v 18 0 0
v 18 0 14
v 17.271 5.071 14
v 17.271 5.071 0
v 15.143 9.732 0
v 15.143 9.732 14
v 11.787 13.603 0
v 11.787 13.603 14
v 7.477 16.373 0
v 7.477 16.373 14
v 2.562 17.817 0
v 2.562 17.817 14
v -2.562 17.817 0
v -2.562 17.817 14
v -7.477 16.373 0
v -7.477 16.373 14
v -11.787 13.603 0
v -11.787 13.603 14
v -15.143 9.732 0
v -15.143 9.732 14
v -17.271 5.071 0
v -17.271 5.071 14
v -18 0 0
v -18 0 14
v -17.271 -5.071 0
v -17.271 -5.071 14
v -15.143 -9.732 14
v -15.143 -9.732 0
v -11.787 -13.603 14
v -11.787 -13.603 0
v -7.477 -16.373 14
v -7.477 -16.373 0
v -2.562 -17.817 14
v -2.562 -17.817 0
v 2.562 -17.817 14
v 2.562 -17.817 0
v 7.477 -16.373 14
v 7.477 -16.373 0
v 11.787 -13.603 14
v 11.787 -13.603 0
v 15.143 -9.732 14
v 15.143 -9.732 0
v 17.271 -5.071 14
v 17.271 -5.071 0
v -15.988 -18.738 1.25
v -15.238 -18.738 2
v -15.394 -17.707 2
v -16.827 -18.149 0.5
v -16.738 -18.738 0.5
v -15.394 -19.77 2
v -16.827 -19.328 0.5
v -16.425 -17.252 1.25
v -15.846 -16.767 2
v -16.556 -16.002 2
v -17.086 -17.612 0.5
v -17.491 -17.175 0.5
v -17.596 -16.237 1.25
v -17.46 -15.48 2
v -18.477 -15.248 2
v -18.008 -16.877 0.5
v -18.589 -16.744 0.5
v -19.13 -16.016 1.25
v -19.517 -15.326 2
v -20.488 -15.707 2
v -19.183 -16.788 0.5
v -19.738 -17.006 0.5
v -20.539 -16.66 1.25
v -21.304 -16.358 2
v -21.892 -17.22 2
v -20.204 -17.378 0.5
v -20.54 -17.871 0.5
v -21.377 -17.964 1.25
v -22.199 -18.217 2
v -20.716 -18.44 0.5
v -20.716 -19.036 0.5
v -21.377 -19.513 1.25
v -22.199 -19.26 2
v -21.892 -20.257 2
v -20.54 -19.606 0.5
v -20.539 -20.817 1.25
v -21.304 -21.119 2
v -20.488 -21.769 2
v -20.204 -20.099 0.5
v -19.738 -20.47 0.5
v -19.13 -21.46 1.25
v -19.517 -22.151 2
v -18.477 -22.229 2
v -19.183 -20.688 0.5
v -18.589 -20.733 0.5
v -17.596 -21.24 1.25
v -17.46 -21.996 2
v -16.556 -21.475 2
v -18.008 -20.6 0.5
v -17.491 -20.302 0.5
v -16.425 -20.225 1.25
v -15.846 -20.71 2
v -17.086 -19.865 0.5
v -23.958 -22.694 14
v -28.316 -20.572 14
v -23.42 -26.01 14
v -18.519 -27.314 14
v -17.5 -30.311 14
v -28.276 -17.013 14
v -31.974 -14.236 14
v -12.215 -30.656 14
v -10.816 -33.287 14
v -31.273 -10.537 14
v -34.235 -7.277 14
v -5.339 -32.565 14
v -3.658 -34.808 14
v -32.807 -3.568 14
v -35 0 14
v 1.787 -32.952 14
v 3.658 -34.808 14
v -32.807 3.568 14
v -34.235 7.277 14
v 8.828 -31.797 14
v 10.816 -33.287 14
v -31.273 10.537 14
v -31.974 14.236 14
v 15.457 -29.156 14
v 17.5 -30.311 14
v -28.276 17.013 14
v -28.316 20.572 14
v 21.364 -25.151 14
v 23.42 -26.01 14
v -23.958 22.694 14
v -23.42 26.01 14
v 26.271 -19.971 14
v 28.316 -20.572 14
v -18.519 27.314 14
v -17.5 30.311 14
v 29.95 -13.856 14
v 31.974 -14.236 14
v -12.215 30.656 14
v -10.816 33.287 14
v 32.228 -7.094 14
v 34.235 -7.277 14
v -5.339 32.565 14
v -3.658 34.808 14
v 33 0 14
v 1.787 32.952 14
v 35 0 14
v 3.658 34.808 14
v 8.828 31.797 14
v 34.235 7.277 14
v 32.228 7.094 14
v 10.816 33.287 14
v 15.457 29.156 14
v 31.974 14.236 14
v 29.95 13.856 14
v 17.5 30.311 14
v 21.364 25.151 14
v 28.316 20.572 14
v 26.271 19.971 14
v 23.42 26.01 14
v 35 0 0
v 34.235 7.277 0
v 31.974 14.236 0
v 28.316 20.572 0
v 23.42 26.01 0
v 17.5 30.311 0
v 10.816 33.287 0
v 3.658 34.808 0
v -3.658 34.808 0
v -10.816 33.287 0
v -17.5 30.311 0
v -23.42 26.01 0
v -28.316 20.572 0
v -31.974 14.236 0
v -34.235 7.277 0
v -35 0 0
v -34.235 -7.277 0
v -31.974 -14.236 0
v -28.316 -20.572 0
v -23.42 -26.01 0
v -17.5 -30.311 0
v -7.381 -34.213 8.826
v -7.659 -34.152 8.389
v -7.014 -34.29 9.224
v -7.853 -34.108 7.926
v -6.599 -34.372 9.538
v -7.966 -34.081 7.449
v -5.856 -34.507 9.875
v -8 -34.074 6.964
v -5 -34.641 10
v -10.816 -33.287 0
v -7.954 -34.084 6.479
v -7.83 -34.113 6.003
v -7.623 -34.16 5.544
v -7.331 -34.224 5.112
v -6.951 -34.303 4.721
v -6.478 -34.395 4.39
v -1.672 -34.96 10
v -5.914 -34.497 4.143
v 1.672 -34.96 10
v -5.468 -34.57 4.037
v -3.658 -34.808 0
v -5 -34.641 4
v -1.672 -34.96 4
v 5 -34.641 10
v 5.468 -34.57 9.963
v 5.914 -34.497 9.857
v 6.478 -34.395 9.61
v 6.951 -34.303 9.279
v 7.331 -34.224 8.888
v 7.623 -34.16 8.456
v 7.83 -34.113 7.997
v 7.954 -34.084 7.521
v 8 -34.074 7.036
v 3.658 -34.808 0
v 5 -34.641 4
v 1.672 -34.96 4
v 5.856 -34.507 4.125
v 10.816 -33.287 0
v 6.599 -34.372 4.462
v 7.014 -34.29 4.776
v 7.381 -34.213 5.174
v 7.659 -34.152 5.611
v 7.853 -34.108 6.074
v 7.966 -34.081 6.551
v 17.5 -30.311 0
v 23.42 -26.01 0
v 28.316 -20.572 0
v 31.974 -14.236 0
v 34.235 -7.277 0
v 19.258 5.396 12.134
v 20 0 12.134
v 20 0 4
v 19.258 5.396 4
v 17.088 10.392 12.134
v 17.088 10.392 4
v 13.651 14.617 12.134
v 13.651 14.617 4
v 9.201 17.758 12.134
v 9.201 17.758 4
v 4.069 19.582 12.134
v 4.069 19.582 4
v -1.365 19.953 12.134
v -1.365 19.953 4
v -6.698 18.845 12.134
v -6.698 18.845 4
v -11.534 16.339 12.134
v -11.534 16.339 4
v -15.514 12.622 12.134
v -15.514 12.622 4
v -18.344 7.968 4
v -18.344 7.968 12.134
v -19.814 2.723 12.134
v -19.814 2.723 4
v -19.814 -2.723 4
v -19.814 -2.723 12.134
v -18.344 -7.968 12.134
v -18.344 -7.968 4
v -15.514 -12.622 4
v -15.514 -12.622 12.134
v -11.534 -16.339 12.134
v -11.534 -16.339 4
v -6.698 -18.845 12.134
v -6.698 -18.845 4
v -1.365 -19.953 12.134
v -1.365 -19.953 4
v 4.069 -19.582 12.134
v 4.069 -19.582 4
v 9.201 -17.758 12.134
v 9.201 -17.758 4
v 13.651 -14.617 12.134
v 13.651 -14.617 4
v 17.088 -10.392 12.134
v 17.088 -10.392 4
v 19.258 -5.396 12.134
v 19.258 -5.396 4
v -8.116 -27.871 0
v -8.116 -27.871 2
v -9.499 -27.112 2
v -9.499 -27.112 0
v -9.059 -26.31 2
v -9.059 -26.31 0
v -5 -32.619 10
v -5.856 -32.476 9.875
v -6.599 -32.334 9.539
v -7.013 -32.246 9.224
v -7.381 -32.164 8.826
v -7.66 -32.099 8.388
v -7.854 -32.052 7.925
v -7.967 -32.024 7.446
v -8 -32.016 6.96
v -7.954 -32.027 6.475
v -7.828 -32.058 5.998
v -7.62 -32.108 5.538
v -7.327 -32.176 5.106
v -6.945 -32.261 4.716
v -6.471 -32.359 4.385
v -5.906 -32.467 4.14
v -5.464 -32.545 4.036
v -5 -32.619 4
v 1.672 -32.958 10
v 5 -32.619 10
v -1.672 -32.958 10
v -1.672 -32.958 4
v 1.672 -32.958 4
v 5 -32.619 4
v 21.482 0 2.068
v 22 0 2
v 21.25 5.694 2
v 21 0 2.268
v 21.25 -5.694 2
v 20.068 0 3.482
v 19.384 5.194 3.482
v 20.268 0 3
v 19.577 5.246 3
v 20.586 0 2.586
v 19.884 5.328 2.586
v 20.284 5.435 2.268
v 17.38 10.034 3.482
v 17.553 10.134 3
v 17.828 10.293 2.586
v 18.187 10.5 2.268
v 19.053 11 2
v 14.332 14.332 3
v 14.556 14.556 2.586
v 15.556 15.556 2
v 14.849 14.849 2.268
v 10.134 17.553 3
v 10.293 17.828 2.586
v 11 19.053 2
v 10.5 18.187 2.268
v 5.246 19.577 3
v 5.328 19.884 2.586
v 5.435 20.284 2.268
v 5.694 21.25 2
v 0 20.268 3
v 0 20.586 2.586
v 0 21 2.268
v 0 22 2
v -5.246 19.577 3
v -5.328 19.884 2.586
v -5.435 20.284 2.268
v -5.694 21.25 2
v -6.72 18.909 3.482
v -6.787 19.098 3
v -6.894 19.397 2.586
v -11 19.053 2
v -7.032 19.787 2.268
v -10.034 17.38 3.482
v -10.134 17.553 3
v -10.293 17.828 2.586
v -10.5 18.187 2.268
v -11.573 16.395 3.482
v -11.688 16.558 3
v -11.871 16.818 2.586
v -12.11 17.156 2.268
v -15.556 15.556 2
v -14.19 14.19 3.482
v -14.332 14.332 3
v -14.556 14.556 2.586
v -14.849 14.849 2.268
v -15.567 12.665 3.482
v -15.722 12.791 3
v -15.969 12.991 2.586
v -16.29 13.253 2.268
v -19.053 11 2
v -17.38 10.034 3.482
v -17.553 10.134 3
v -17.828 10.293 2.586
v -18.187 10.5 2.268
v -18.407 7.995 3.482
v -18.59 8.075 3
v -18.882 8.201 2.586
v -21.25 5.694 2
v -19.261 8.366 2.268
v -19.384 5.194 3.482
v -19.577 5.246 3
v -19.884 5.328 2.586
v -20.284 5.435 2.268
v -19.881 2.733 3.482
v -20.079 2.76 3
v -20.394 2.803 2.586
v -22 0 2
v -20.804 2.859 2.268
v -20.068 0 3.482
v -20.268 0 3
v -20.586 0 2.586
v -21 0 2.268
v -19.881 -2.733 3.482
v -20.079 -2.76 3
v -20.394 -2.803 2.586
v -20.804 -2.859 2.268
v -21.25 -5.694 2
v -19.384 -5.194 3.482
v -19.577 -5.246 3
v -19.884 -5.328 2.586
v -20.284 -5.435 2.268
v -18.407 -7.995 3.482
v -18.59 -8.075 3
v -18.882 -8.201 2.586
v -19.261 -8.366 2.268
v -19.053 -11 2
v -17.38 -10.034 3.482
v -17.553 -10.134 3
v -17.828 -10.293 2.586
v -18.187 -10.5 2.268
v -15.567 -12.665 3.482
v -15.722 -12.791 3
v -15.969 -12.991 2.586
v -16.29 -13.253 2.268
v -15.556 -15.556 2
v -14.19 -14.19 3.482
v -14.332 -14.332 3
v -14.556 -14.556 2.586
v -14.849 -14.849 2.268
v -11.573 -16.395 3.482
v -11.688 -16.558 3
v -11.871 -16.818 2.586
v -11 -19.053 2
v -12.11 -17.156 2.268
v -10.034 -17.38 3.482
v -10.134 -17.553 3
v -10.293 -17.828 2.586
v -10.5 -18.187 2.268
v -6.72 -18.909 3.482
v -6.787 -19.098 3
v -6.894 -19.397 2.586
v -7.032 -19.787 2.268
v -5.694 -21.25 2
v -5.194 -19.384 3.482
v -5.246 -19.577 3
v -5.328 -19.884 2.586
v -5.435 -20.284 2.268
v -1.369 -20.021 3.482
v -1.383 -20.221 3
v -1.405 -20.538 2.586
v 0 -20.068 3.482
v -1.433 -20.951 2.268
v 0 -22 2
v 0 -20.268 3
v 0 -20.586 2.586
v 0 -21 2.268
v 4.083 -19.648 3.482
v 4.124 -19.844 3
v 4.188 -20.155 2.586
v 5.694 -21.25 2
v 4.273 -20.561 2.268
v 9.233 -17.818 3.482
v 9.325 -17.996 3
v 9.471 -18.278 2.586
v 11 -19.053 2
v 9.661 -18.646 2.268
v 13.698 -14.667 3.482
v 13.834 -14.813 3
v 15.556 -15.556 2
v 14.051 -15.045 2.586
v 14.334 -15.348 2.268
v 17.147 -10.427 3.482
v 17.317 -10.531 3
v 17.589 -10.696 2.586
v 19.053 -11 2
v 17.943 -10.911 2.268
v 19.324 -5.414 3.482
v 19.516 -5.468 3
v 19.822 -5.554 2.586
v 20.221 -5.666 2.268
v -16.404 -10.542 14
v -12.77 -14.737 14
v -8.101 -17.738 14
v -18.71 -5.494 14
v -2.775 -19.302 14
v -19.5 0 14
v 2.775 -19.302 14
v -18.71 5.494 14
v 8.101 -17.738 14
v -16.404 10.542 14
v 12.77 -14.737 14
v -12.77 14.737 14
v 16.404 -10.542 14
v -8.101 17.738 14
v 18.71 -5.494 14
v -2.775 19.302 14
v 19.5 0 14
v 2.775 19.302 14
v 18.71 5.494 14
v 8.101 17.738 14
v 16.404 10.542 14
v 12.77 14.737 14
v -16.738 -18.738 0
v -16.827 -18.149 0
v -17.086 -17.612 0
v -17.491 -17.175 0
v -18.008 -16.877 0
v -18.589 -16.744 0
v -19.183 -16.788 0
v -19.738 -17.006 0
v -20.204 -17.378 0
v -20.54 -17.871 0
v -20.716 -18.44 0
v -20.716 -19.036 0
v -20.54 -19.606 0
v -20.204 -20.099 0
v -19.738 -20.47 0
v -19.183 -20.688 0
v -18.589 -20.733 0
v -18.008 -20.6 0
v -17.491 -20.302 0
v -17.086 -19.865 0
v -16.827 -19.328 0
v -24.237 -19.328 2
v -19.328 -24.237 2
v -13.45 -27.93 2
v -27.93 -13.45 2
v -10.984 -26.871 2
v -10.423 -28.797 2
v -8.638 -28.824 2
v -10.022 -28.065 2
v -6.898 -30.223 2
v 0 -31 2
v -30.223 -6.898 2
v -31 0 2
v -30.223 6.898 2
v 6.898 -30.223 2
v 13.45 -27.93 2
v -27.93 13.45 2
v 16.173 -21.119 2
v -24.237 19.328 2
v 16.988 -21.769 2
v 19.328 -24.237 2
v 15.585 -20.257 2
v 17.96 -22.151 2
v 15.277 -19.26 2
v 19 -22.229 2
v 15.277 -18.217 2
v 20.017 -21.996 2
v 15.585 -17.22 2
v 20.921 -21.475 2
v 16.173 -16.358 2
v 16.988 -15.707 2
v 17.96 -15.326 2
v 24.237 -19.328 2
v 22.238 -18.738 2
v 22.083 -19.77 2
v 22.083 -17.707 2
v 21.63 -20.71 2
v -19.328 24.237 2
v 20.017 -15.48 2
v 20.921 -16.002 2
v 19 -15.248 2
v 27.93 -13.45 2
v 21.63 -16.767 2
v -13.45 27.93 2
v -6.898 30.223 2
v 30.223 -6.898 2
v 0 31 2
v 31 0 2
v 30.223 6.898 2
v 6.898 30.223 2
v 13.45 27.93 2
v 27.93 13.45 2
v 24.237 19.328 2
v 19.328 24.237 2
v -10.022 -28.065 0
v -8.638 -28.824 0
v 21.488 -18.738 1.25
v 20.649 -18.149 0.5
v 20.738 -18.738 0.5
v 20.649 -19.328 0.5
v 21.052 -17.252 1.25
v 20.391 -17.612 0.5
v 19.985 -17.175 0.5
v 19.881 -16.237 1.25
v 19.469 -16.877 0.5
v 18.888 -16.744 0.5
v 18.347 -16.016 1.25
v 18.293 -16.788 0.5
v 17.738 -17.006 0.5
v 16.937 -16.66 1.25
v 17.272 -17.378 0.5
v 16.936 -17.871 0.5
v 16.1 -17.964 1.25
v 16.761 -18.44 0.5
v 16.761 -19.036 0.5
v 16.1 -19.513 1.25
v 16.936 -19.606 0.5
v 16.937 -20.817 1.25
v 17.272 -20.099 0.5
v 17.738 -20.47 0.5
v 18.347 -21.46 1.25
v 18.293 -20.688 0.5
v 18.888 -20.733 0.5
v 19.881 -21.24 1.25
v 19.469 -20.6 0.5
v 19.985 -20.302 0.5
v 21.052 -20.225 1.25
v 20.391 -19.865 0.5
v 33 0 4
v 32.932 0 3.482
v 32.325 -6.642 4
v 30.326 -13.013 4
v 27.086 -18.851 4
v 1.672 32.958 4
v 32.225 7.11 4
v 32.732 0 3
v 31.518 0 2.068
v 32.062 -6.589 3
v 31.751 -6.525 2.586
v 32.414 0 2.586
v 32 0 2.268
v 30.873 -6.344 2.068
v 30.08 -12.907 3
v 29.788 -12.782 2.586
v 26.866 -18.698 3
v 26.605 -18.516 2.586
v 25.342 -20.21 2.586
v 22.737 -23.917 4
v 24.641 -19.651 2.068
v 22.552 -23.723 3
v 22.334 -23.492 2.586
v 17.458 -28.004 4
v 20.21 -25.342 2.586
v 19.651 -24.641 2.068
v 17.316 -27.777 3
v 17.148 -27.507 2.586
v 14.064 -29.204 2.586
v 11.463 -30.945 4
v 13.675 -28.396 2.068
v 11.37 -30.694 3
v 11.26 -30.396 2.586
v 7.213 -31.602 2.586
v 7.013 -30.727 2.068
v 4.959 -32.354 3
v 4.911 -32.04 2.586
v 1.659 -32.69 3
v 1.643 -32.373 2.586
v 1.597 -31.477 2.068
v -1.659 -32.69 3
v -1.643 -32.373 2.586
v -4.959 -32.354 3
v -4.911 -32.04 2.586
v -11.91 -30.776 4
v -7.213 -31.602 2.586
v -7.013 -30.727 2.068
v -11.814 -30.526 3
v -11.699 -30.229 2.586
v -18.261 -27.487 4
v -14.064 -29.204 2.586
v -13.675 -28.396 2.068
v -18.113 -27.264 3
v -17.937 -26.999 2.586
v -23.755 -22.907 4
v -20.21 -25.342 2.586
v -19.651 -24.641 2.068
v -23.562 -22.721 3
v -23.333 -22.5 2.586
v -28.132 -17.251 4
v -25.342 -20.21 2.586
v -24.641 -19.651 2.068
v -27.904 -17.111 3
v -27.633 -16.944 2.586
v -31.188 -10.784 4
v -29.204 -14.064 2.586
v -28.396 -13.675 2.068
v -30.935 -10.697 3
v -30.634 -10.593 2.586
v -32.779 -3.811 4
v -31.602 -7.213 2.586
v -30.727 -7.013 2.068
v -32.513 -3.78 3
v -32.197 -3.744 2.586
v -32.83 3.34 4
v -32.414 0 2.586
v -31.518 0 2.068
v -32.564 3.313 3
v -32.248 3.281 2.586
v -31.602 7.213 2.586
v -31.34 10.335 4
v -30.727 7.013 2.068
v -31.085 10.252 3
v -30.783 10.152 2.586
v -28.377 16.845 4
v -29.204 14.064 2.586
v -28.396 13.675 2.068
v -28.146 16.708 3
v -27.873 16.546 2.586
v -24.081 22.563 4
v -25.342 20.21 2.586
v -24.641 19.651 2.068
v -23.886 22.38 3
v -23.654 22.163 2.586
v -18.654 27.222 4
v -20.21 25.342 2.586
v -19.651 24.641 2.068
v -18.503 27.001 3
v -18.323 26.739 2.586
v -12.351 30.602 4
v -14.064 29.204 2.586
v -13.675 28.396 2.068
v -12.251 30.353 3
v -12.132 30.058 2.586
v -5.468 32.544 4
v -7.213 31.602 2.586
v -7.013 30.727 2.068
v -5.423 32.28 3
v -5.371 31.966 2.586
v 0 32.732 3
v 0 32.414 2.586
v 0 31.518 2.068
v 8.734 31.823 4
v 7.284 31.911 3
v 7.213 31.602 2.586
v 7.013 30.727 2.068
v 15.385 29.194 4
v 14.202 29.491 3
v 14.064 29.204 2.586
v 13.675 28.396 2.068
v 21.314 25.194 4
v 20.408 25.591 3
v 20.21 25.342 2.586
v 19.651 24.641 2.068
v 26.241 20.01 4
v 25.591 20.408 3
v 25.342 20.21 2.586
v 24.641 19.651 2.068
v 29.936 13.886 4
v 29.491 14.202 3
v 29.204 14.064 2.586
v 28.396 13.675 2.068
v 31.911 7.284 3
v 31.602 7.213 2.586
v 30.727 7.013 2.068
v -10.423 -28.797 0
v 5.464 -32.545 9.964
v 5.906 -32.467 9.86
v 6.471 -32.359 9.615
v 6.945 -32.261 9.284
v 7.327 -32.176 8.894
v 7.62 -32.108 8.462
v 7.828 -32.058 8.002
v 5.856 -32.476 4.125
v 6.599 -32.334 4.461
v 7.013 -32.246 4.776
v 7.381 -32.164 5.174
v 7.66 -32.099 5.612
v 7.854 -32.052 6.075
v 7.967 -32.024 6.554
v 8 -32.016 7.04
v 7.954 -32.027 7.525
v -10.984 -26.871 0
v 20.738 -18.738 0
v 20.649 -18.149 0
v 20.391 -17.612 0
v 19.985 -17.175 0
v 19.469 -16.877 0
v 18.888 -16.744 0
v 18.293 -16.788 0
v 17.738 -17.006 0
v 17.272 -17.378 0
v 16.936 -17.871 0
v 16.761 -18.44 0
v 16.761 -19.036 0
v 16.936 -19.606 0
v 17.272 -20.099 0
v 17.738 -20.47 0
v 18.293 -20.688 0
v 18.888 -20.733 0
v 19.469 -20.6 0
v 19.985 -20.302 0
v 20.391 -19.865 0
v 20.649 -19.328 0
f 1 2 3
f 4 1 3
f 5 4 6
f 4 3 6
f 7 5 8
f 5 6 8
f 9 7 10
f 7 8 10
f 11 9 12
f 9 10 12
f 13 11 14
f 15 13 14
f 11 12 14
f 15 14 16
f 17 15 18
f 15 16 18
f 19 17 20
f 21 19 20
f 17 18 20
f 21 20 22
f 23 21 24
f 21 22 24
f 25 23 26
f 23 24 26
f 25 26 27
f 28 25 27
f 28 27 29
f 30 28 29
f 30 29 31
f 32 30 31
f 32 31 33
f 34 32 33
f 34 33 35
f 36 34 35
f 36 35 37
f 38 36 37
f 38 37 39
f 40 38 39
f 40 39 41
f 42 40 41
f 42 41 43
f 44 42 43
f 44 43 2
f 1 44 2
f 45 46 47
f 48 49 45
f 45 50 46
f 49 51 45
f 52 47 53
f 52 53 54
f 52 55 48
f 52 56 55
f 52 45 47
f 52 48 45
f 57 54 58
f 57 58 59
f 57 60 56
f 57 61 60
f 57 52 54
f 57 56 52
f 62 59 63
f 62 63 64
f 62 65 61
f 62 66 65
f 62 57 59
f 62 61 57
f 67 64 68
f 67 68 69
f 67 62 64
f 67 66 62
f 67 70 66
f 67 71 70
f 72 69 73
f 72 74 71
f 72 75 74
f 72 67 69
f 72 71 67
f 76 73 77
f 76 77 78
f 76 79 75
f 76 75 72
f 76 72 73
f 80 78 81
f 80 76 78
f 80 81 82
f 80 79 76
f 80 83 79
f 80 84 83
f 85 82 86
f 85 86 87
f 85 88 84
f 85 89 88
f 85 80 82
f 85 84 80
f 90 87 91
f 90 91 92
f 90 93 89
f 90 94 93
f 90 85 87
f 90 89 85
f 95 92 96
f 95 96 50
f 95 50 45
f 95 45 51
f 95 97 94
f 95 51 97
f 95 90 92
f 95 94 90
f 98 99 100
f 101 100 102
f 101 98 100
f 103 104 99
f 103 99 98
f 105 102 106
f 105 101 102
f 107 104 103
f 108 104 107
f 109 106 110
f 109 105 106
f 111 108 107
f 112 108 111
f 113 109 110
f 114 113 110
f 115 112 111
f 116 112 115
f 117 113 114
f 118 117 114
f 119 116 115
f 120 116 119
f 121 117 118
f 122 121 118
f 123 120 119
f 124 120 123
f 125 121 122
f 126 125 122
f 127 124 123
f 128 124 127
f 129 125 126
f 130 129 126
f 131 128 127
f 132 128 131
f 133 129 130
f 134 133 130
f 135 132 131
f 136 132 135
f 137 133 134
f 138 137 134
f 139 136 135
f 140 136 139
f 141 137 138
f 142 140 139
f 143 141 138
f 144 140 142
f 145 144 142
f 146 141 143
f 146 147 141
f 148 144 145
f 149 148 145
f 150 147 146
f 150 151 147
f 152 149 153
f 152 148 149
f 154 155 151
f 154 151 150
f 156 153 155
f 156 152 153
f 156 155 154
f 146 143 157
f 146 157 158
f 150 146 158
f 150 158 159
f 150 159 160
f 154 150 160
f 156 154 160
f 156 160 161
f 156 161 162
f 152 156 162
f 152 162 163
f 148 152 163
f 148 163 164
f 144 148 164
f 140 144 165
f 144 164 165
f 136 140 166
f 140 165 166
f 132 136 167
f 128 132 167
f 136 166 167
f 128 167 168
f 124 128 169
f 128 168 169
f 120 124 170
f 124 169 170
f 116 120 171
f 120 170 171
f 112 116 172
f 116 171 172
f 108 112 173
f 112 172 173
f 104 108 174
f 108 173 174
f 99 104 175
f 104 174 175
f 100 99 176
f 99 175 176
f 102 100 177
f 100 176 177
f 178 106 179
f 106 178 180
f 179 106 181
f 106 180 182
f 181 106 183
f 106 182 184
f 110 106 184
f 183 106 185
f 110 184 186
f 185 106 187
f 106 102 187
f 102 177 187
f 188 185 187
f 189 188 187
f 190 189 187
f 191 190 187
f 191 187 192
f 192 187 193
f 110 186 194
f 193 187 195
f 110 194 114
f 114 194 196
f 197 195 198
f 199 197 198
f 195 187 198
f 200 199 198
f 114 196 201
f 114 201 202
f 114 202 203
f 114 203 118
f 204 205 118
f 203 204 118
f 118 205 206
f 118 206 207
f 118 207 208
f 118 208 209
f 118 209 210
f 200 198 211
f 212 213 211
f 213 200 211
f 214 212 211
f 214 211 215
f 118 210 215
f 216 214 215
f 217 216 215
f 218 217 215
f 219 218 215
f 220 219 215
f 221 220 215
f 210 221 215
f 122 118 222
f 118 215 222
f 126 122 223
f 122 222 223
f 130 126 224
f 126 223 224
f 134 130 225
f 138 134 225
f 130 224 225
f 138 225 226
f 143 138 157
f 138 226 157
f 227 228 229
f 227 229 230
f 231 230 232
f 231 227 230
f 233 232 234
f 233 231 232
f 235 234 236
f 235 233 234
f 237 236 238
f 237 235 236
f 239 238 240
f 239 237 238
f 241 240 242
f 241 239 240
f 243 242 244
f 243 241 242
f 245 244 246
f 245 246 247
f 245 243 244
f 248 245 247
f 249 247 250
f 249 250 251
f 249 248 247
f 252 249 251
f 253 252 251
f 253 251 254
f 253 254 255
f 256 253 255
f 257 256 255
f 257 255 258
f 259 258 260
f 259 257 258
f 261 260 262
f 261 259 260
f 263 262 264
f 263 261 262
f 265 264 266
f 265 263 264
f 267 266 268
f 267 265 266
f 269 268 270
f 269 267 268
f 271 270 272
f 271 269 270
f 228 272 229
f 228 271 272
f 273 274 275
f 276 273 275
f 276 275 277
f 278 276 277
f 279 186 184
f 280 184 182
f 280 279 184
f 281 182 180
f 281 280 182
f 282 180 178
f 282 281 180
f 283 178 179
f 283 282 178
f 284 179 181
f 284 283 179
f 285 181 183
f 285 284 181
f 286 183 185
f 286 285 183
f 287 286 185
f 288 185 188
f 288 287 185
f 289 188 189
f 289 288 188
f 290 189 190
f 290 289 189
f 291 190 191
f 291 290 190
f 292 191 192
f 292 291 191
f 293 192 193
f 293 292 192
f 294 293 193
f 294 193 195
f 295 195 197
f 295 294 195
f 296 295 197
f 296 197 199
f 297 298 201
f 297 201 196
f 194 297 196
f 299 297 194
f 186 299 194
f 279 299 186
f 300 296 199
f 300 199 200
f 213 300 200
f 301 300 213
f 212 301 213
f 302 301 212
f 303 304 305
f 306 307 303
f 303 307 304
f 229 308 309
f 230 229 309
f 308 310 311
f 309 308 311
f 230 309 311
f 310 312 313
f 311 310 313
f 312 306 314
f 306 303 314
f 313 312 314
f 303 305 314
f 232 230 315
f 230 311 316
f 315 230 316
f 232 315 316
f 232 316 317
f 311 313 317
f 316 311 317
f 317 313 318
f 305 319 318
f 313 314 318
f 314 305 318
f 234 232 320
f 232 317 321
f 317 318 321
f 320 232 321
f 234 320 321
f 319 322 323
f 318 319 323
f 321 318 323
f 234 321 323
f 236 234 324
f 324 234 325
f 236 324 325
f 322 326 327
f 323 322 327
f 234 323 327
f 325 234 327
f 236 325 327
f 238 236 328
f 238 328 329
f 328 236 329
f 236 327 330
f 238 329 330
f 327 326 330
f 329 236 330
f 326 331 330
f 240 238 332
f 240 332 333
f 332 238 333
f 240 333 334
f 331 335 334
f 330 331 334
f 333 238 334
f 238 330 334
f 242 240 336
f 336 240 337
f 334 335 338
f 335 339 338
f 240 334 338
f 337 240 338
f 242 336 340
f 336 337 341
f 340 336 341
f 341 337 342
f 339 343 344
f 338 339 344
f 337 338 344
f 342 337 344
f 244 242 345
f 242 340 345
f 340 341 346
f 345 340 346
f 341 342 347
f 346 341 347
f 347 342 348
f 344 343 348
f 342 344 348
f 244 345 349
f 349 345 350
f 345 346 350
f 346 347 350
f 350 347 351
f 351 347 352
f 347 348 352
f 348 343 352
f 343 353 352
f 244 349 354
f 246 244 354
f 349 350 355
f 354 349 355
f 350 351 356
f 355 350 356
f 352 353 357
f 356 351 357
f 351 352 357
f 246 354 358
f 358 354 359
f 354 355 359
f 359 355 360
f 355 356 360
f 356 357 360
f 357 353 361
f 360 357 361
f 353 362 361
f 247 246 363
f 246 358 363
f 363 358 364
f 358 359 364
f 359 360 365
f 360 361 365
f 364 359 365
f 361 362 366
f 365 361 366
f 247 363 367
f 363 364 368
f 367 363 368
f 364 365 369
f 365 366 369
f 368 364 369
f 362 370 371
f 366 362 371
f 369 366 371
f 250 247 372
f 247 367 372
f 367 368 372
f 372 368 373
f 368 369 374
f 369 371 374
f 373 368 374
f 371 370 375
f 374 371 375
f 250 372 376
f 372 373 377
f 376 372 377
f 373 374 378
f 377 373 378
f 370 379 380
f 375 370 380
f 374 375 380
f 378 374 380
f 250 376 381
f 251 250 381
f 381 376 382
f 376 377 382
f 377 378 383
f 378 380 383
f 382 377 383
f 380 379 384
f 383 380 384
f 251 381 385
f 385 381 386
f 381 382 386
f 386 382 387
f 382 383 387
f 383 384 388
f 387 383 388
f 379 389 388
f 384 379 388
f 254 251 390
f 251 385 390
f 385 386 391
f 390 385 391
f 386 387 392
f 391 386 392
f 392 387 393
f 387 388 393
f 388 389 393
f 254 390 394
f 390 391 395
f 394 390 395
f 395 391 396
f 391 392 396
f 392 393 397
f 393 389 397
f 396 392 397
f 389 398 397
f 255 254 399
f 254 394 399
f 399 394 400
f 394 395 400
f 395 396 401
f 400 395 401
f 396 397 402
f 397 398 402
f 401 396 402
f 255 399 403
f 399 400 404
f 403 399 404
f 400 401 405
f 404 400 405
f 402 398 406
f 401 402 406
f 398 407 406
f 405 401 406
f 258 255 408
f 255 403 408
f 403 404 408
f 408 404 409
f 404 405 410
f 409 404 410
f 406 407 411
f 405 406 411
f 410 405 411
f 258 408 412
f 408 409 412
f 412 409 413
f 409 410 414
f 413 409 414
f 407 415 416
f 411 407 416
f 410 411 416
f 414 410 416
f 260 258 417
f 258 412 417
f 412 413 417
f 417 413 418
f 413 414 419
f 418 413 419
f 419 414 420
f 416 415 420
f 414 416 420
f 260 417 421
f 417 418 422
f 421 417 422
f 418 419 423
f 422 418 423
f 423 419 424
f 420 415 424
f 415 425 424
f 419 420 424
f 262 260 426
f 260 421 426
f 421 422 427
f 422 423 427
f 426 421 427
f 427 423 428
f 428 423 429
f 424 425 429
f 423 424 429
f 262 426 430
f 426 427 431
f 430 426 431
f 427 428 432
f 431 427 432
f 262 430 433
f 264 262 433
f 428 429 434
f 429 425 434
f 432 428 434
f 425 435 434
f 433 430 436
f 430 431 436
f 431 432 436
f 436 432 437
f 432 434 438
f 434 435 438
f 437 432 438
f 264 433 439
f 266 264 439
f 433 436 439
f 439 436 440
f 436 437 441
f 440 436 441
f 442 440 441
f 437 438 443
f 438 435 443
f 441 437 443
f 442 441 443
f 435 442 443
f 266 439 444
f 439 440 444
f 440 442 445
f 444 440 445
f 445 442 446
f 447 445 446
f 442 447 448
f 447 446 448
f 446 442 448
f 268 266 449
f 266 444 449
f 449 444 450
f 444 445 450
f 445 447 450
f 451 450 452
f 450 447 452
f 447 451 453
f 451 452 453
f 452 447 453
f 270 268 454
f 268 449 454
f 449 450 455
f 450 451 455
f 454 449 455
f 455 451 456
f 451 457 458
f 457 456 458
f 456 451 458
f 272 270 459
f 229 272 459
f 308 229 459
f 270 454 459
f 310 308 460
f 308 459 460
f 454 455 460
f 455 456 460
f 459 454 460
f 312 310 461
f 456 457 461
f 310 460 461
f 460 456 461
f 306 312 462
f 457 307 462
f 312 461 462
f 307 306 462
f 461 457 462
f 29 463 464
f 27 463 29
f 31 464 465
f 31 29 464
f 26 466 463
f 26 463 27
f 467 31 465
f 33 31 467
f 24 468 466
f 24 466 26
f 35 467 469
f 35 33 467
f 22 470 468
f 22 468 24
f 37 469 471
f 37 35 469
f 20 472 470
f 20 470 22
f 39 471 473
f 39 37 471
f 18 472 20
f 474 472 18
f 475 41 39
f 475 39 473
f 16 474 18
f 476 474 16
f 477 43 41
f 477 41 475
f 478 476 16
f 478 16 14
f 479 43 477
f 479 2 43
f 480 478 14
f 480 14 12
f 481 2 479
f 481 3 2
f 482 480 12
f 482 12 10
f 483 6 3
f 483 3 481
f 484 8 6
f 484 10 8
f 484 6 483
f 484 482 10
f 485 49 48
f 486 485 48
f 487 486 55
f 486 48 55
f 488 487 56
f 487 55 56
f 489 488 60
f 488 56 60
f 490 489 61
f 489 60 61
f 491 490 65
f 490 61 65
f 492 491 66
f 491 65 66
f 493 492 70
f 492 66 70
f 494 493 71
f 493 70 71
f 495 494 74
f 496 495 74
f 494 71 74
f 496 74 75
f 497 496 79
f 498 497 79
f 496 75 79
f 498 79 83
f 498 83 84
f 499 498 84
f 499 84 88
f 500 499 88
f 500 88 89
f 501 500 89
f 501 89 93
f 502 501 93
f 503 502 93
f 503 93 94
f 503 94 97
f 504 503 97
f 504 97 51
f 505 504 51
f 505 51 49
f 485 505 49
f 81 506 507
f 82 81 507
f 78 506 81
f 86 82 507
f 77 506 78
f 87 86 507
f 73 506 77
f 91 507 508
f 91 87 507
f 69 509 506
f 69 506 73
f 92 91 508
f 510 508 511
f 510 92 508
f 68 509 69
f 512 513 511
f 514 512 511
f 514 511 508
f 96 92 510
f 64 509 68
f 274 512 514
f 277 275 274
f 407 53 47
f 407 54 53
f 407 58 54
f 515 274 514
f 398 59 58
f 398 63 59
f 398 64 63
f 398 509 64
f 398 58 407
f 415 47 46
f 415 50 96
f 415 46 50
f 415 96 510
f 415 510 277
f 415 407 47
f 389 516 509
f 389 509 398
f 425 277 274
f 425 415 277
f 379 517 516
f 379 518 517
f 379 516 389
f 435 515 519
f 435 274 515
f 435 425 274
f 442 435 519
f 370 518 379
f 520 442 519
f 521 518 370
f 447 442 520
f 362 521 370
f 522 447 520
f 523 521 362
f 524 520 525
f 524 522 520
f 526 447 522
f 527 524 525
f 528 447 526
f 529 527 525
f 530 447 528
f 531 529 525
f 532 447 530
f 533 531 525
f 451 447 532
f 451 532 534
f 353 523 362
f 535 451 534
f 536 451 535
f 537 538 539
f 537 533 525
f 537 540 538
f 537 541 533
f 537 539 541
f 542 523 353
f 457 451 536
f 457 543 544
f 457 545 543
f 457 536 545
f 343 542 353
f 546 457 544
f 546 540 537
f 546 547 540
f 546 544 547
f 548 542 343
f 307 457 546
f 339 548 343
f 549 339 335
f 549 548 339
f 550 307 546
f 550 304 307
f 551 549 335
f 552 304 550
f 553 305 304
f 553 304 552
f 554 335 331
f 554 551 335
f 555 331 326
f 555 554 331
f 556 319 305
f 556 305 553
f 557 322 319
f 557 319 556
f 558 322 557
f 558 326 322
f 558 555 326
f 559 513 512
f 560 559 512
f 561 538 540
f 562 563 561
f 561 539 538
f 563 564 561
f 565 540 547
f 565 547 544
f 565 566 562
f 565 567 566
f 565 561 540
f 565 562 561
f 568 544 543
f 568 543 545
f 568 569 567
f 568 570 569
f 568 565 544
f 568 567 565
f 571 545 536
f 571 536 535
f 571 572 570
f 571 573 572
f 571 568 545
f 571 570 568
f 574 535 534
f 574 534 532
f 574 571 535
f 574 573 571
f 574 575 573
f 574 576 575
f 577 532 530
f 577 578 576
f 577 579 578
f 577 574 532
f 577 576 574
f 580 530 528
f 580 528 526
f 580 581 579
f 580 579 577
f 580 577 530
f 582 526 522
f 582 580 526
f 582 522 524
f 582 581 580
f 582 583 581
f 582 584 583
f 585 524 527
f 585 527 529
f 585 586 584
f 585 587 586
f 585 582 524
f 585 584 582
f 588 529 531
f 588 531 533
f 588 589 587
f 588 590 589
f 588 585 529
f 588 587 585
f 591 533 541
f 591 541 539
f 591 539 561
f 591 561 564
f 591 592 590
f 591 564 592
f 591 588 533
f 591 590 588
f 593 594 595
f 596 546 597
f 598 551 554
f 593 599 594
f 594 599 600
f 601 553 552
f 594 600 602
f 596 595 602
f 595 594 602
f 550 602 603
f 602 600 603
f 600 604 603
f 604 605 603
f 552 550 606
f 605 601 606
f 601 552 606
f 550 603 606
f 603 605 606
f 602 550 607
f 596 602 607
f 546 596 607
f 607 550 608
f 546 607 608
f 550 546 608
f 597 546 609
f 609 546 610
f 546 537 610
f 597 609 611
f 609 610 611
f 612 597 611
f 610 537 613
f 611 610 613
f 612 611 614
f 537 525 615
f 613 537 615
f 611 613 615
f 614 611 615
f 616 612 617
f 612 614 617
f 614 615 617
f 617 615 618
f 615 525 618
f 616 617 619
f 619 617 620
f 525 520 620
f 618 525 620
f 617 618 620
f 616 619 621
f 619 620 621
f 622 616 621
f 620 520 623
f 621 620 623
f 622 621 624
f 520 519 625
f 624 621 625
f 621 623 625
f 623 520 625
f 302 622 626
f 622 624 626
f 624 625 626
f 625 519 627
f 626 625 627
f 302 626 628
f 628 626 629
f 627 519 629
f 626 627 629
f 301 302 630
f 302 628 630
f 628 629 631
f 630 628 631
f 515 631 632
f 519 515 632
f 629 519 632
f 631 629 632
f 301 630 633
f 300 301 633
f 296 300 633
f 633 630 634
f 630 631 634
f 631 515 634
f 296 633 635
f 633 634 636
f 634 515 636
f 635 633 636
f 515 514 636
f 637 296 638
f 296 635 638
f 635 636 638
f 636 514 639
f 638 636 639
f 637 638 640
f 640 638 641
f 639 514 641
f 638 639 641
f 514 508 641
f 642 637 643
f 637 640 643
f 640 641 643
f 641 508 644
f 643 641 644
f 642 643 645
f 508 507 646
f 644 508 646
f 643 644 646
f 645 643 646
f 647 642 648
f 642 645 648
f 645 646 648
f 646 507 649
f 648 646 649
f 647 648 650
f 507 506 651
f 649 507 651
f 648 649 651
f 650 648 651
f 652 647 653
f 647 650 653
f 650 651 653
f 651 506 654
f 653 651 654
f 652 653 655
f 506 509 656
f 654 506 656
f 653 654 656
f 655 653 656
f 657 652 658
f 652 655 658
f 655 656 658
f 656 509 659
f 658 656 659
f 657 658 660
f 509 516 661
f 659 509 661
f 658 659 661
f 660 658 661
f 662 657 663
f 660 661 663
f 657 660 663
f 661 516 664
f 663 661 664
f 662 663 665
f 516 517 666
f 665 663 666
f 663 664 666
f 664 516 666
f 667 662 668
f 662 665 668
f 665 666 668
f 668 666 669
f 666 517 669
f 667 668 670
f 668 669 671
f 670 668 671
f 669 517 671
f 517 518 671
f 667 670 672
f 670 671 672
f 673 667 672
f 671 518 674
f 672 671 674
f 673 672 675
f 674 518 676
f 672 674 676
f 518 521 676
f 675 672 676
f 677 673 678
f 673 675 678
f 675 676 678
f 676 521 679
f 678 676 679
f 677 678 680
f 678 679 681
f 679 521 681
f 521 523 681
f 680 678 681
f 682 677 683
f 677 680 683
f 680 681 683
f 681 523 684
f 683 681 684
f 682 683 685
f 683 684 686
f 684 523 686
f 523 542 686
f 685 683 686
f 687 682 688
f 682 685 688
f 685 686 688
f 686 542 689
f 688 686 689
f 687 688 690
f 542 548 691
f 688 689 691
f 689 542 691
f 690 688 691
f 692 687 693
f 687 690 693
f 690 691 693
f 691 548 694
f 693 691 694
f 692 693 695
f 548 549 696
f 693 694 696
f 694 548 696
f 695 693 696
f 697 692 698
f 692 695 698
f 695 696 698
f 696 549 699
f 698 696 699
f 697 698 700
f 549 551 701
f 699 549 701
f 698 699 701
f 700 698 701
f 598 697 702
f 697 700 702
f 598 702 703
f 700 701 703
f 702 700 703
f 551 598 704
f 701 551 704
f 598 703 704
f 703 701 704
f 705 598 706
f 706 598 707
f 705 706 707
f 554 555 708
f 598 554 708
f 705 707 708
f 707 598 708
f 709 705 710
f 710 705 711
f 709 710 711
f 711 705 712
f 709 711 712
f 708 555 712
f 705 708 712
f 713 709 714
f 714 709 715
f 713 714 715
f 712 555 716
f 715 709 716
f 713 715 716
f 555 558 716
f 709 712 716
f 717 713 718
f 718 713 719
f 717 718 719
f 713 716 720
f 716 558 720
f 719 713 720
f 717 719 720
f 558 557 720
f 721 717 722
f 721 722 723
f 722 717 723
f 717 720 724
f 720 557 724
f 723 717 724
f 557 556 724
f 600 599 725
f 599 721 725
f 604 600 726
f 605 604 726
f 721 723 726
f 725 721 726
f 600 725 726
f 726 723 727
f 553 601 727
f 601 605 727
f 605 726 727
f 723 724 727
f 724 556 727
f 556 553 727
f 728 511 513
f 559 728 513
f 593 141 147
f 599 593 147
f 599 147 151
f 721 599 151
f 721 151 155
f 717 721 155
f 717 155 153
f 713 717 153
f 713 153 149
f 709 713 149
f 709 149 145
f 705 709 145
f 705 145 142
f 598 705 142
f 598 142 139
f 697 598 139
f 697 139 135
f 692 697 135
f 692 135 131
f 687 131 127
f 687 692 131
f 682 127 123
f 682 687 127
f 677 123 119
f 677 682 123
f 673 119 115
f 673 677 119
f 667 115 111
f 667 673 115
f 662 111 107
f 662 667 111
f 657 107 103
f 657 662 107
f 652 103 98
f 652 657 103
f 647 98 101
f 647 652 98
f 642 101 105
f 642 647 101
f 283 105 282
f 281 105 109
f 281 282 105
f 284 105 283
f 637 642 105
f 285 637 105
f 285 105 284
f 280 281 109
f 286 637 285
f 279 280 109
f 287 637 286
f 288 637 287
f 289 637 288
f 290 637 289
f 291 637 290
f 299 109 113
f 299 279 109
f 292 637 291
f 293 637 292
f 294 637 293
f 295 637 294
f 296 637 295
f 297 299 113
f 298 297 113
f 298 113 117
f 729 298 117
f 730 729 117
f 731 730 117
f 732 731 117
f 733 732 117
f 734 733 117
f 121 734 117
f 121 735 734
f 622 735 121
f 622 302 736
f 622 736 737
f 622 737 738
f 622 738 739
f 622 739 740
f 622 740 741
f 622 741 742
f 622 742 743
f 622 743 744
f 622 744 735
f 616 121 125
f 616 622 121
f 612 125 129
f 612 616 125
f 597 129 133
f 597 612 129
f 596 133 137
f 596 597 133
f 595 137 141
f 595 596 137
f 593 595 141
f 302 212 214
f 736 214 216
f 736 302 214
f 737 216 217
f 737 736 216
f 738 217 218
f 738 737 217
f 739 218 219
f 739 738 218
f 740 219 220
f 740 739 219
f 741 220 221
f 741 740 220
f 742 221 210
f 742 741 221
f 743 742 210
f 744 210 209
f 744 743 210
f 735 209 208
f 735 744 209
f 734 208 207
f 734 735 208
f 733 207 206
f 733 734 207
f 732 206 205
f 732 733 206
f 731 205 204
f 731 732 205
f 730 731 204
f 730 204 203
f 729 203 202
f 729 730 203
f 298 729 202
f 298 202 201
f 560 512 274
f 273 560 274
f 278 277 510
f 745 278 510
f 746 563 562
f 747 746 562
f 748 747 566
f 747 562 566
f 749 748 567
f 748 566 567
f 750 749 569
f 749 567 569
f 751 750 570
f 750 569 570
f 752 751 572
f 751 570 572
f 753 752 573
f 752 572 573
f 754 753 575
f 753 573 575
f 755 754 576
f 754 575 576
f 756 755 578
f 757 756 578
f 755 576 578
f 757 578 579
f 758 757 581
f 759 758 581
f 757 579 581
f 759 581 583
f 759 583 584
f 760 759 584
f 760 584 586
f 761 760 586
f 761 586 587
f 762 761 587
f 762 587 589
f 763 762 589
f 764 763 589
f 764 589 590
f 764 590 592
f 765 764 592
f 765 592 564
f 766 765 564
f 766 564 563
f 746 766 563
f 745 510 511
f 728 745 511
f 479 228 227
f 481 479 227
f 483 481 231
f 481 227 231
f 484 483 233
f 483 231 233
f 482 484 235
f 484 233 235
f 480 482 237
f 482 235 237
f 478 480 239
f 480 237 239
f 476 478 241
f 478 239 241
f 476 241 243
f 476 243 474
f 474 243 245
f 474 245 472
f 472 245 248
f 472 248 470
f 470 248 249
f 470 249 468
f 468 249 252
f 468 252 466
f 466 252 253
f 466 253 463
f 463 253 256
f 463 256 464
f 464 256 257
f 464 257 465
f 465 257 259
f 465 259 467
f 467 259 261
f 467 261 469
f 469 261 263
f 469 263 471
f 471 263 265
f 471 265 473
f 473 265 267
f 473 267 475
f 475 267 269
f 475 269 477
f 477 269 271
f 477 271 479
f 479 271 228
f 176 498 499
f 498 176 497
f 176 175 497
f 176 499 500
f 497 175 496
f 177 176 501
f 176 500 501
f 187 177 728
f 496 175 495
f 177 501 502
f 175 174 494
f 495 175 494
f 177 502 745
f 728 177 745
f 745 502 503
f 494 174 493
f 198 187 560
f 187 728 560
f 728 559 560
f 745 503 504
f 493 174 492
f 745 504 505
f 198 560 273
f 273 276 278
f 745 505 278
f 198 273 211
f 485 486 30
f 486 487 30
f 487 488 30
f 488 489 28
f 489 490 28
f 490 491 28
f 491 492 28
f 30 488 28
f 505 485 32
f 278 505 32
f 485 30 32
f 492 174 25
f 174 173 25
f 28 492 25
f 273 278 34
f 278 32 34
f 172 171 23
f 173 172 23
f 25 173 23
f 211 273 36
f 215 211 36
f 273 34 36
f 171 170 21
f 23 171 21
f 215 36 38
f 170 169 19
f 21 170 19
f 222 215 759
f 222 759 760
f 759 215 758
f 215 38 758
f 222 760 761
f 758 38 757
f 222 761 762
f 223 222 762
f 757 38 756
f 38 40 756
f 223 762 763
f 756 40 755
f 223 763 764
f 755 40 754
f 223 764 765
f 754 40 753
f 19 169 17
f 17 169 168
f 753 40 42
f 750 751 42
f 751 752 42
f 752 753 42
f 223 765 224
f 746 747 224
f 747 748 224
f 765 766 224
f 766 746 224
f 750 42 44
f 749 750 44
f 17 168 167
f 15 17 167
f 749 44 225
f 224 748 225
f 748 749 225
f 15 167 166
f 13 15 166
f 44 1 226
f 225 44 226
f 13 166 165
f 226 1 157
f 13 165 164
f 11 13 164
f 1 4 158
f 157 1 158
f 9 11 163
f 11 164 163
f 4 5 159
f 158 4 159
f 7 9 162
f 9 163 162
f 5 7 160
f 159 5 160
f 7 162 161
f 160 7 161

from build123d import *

# Parameters (mm, degrees)
CROQUIS1_R              = 35
SALIENTE_EXTRUIR1_DEPTH = 14
CROQUIS2_R              = 18
CORTAR_EXTRUIR1_DEPTH   = 52.439284598
VACIADO1_T              = -2
REDONDEO1_R             = 2
CORTAR_EXTRUIR2_START   = -22
CORTAR_EXTRUIR2_DEPTH   = 30.439284598
CROQUIS4_R              = 2
CORTAR_EXTRUIR3_DEPTH   = 51.931326474
CHAFL_N1_SIZE           = 1.5
CHAFL_N2_SIZE           = 0.5
CHAFL_N2_SIZE2          = 1.866025404


with BuildPart() as part:
    # Croquis1 → Saliente-Extruir1 (new body)
    with BuildSketch(Plane.XY):
        Circle(CROQUIS1_R)
    extrude(amount=SALIENTE_EXTRUIR1_DEPTH)

    # Croquis2 → Cortar-Extruir1 (cut, through all)
    with BuildSketch(Plane.XY.offset(14)):
        Circle(CROQUIS2_R)
    extrude(amount=-CORTAR_EXTRUIR1_DEPTH, mode=Mode.SUBTRACT)

    # Vaciado1
    vaciado1_openings = [part.faces().sort_by_distance(p)[0] for p in [
        (-34.010050506, 0, 14),
    ]]
    offset(amount=VACIADO1_T, openings=vaciado1_openings, kind=Kind.INTERSECTION)

    # Redondeo1
    redondeo1_edges = [part.edges().sort_by_distance(p)[0] for p in [
        (-33, 0, 2),
        (-20, 0, 2),
    ]]
    fillet(redondeo1_edges, radius=REDONDEO1_R)

    # Croquis3 → Cortar-Extruir2 (cut, through all)
    with BuildSketch(Plane(origin=(0, 0, 0), x_dir=(1, 0, 0), z_dir=(0, 1, 0)).offset(CORTAR_EXTRUIR2_START)):
        with BuildLine():
            Line((-5, -4), (5, -4))
            ThreePointArc((5, -4), (8, -7), (5, -10))
            Line((5, -10), (-5, -10))
            ThreePointArc((-5, -10), (-8, -7), (-5, -4))
        make_face()
    extrude(amount=-CORTAR_EXTRUIR2_DEPTH, mode=Mode.SUBTRACT)

    # Croquis4 → Cortar-Extruir3 (cut, through all)
    with BuildSketch(Plane.XY.offset(2)):
        with Locations((-18.738329701, -18.738329701)):
            Circle(CROQUIS4_R)
        with Locations((18.738329701, -18.738329701)):
            Circle(CROQUIS4_R)
        Polygon((-8.115597392, -27.870752521), (-9.499112417, -27.112050733), (-9.05906538, -26.309612019), (-10.984489851, -26.871194156), (-10.422907714, -28.796618627), (-10.021777616, -28.065146095), (-8.638262591, -28.823847883), align=None)
    extrude(amount=-CORTAR_EXTRUIR3_DEPTH, mode=Mode.SUBTRACT)

    # Chaflán1
    chafl_n1_edges = [part.edges().sort_by_distance(p)[0] for p in [
        (-20.738329701, -18.738329701, 2),
        (16.738329701, -18.738329701, 2),
    ]]
    chamfer(chafl_n1_edges, length=CHAFL_N1_SIZE)

    # Chaflán2
    chafl_n2_edges = [part.edges().sort_by_distance(p)[0] for p in [
        (-20, 0, 14),
    ]]
    chafl_n2_side = [part.faces().sort_by_distance(p)[0] for p in [
        (-19.434314575, 0, 14),
    ]]
    chamfer(chafl_n2_edges, length=CHAFL_N2_SIZE, length2=CHAFL_N2_SIZE2, reference=chafl_n2_side[0])


solid = part.part
